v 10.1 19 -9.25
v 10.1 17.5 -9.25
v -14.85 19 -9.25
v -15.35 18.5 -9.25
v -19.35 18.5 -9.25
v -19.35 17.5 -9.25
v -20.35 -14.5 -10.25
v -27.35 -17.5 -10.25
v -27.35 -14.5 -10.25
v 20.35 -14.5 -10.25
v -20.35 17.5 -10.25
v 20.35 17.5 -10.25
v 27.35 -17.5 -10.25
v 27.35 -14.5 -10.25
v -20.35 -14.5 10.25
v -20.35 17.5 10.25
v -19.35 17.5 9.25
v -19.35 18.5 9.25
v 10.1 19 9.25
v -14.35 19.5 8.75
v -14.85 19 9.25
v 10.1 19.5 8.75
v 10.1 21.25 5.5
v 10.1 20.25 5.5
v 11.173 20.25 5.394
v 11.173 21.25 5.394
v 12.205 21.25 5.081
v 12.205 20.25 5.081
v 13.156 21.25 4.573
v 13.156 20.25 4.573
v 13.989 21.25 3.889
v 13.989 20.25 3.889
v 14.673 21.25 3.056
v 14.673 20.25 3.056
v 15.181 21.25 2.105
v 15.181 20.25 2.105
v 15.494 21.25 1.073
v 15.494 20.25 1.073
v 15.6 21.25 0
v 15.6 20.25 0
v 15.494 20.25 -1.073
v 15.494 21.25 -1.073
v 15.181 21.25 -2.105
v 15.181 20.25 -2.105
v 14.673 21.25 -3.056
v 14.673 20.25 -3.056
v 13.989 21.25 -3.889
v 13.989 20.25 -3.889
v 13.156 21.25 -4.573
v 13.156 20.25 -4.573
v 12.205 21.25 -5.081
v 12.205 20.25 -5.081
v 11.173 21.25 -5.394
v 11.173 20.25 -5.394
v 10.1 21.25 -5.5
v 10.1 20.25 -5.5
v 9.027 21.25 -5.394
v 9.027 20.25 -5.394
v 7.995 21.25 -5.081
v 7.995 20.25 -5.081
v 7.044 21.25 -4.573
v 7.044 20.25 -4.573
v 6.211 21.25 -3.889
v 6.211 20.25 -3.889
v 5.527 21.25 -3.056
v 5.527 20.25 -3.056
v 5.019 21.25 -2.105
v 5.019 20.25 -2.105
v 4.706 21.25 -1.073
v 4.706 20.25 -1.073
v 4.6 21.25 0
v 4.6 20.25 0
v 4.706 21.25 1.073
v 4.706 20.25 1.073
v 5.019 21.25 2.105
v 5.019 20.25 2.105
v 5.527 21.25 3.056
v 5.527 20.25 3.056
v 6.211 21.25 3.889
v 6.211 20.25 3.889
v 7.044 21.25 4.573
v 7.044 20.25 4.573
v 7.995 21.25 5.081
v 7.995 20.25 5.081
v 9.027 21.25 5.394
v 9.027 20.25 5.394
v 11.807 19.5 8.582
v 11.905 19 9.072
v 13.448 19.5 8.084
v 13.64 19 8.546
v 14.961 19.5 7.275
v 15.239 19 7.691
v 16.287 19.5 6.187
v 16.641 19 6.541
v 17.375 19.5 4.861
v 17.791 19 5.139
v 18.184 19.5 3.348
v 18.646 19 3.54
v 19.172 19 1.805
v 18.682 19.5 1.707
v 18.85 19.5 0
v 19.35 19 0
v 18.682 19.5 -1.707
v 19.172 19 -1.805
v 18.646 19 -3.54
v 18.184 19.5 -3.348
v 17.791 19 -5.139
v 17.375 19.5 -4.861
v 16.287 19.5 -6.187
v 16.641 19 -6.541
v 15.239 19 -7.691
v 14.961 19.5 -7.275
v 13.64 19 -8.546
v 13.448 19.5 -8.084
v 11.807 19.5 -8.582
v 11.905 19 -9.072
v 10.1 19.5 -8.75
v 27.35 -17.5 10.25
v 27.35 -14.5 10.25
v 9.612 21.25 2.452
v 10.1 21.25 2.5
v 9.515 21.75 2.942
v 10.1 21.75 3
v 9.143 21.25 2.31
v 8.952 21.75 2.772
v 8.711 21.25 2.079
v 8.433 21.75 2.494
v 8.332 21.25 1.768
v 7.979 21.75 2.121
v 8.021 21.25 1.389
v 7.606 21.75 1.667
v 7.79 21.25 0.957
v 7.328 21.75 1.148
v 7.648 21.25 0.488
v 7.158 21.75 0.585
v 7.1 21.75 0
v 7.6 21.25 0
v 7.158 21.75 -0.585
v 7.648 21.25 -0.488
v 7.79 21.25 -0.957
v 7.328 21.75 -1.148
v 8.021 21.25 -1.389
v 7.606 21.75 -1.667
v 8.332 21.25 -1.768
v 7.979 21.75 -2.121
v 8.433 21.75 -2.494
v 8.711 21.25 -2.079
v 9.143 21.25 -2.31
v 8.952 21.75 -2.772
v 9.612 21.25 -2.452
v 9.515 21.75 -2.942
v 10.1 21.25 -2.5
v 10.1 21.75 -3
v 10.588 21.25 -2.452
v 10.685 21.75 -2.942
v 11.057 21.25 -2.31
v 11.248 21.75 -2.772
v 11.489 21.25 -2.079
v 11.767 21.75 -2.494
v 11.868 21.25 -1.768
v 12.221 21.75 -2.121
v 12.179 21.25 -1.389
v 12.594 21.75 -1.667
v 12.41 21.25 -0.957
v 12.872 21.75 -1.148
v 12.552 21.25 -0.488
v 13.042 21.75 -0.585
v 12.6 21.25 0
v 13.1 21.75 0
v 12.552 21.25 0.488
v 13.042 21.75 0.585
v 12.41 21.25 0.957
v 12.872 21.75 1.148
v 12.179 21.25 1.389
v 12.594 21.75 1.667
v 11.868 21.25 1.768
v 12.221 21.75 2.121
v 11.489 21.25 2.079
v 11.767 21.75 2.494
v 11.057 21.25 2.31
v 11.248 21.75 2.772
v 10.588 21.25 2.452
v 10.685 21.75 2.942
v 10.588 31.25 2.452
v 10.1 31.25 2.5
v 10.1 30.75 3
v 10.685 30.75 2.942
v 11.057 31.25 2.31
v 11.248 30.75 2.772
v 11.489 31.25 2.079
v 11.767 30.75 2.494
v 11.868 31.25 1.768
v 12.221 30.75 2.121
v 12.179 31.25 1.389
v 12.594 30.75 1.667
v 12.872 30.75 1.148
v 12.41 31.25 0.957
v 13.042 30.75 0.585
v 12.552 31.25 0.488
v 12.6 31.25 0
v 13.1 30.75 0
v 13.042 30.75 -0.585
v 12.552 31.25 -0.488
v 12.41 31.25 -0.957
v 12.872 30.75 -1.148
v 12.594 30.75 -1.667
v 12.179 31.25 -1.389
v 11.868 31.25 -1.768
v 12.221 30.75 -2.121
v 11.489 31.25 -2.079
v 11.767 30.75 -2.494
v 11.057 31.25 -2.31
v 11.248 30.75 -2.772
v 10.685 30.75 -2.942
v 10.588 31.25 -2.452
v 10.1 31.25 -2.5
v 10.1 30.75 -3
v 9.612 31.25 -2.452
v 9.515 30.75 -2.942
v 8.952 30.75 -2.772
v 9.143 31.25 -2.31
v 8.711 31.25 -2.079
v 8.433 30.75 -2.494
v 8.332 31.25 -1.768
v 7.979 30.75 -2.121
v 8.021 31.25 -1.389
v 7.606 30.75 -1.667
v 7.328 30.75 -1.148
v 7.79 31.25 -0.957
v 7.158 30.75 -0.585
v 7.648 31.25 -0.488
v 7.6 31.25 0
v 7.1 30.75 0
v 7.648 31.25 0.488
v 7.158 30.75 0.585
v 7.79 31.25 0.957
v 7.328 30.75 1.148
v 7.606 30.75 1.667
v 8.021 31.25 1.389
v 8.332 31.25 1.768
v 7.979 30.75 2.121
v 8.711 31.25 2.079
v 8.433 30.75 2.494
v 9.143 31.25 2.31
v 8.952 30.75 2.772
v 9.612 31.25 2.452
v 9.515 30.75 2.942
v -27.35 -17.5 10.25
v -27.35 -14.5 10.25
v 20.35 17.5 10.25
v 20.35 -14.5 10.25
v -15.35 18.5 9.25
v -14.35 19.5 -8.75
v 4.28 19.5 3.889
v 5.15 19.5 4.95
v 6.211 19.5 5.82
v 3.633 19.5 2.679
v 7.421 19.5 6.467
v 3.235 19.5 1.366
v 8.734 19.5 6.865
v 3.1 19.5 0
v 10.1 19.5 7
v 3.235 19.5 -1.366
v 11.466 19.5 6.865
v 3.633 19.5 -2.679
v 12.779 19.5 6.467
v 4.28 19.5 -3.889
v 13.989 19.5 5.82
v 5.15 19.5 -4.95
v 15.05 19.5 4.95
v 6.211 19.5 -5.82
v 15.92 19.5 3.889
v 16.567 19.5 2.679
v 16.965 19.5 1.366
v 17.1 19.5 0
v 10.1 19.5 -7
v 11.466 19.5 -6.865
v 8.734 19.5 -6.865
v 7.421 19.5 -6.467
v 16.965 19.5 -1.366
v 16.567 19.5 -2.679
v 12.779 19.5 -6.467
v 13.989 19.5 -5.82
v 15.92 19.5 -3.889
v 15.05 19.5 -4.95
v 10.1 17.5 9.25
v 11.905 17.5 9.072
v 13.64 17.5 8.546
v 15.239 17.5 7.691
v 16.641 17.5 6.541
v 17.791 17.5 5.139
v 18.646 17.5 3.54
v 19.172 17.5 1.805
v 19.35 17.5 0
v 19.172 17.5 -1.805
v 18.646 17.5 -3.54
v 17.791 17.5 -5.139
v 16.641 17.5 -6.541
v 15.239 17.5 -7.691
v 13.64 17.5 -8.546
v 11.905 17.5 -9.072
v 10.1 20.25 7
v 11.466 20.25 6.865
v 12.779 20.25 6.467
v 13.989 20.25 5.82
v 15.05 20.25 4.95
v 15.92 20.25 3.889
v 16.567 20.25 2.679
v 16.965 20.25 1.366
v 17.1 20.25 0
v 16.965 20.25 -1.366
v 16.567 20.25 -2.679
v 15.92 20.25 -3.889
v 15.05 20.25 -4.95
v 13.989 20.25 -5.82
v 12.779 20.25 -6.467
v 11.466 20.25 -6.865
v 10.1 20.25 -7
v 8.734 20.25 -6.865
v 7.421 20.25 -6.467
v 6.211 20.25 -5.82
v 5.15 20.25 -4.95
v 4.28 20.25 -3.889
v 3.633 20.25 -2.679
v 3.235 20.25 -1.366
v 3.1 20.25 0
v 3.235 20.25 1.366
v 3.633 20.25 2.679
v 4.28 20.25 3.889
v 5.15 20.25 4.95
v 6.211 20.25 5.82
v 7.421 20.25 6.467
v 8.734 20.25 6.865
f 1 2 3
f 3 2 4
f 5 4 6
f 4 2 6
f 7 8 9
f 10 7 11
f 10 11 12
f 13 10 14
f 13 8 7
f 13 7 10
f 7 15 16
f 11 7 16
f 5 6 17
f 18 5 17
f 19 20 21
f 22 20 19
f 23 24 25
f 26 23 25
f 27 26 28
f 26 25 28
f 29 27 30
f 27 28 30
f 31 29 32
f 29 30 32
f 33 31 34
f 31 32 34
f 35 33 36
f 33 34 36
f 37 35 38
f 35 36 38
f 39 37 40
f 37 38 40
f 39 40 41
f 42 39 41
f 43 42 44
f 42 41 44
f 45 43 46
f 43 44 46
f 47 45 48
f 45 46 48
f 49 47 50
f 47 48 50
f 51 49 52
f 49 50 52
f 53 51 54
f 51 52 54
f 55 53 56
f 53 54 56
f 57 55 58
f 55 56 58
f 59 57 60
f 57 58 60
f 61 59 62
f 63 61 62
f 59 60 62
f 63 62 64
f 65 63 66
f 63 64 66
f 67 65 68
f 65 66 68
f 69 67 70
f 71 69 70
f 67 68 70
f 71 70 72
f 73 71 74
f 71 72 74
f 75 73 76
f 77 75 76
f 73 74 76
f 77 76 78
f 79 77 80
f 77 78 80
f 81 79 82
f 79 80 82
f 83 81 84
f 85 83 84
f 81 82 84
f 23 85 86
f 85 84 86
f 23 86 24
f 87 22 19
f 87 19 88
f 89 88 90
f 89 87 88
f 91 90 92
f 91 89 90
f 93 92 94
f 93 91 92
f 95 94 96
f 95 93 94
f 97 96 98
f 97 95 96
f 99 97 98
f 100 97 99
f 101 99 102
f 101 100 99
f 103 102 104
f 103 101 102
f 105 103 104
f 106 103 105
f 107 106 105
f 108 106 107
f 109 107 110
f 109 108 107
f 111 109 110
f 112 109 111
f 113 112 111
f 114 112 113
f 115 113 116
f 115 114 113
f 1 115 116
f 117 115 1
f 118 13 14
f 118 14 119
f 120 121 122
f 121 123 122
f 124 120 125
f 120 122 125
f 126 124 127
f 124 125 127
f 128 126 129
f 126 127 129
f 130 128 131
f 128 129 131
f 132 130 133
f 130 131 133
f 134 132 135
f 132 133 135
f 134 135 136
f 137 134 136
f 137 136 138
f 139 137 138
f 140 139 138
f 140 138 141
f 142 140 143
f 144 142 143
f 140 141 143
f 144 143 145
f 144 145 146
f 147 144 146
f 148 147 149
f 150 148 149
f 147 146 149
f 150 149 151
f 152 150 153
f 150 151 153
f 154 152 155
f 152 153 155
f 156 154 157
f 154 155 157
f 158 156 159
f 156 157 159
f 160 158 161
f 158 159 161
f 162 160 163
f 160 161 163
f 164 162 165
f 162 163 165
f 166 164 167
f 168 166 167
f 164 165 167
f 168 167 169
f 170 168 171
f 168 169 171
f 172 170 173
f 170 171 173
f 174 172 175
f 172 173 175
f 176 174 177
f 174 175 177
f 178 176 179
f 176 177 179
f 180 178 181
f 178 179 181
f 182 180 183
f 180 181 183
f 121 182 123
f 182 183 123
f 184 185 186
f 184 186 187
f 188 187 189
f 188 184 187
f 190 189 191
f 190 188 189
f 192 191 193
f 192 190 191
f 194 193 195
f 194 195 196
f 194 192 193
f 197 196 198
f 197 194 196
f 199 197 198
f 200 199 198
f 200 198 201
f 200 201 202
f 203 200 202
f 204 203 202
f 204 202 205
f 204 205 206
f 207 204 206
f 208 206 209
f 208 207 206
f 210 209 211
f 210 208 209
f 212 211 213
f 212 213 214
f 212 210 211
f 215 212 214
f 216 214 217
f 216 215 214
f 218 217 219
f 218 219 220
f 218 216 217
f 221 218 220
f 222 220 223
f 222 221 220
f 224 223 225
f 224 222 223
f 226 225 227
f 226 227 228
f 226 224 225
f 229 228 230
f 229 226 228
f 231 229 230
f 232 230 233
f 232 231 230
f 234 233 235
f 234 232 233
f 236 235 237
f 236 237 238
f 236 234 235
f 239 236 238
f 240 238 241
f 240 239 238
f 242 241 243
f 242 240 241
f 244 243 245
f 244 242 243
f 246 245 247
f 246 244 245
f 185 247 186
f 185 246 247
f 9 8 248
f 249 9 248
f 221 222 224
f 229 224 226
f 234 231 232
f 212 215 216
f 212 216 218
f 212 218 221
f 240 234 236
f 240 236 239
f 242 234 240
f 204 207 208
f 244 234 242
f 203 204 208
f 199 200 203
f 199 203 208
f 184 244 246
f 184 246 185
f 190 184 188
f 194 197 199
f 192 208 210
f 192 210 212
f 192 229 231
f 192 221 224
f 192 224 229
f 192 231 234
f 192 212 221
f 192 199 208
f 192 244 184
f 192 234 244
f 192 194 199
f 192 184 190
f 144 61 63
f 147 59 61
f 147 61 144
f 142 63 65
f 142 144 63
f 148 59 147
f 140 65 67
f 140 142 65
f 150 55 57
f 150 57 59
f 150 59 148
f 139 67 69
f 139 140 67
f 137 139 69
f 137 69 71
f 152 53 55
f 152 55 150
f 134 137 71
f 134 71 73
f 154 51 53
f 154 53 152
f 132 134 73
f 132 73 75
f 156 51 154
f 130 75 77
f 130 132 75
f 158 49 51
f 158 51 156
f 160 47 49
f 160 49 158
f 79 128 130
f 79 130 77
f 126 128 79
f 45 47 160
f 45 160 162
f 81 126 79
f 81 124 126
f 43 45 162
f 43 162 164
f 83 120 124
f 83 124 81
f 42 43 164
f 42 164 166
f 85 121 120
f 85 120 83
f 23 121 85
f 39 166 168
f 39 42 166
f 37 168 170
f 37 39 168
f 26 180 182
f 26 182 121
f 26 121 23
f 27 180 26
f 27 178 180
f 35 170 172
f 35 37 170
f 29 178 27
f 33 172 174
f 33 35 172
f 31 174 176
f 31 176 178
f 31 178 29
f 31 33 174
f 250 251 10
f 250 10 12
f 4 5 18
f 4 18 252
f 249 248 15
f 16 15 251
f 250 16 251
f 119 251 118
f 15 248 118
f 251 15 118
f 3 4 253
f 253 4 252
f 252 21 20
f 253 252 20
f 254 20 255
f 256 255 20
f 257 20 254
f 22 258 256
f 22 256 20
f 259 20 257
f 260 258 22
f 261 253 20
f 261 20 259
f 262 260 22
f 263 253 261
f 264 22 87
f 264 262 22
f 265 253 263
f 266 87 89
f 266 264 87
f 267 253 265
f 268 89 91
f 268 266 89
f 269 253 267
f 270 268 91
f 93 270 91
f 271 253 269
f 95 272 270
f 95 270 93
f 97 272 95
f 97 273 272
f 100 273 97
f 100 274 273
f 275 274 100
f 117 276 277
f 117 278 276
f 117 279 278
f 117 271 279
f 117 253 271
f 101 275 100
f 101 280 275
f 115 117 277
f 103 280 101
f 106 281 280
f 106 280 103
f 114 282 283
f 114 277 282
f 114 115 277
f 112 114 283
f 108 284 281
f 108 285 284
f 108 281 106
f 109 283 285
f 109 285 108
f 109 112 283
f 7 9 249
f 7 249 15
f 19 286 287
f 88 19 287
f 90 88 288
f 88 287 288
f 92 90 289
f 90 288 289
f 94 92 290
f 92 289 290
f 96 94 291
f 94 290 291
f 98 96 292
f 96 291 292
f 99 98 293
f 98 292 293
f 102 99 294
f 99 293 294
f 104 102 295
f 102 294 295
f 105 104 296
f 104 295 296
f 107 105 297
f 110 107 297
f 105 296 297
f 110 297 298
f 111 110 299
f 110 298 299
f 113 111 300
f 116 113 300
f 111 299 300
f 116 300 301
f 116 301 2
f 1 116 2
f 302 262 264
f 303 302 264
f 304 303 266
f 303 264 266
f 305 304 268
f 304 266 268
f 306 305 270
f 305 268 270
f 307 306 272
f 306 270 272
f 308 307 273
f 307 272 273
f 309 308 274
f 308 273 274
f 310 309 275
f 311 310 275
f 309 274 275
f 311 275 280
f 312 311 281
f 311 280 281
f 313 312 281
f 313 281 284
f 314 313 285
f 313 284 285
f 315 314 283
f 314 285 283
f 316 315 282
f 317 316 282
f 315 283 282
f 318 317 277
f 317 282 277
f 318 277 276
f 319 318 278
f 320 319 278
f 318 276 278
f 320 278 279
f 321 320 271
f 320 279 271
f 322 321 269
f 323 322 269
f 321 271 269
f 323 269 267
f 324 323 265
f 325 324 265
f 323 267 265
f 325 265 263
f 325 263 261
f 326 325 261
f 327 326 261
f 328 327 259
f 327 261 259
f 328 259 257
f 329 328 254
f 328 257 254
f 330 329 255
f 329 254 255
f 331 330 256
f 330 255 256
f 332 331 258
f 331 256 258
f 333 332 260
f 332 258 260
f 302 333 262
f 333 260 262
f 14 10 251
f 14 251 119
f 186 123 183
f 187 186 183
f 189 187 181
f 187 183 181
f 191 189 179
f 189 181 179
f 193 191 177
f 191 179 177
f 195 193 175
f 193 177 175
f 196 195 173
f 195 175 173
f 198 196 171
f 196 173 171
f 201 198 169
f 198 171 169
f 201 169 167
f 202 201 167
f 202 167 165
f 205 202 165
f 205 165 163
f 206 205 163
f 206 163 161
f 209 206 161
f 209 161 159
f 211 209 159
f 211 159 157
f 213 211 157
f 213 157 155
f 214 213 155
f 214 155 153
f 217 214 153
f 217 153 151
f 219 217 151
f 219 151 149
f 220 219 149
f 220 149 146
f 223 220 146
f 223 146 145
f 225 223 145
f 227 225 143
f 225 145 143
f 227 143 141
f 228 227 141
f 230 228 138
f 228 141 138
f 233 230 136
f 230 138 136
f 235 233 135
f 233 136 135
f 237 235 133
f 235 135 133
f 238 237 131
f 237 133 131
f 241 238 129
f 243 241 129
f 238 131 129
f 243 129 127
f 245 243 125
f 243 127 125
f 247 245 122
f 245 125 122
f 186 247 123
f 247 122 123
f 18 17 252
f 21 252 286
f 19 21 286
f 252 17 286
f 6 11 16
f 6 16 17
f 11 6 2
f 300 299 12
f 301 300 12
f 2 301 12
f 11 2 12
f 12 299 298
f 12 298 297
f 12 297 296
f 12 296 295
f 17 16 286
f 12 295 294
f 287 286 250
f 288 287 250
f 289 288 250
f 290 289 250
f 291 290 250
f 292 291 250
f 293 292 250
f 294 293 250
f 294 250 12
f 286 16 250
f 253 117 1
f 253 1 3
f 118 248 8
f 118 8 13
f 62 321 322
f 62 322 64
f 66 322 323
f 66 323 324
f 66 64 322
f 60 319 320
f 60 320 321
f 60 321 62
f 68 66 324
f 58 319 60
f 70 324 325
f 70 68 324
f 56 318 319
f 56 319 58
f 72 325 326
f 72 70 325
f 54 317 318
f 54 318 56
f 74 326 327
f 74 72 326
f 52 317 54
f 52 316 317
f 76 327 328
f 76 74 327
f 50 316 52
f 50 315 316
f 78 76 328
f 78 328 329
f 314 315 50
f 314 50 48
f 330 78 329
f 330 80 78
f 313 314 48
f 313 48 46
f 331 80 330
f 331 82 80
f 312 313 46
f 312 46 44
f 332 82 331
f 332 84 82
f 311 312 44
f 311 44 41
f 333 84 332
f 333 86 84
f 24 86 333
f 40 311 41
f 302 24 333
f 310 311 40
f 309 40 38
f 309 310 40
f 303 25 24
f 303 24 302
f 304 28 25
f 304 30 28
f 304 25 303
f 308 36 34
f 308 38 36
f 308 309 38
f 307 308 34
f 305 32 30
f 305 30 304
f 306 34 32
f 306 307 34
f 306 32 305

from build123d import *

# Parameters (mm, degrees)
SKETCH_1_W              = 40.7
SKETCH_1_H              = 35
EXTRUDE_BOSS_DEPTH      = 10.25
EXTRUDE_2_DEPTH         = 2
EXTRUDE_CUT_DEPTH       = 18.5
CROQUIS10_R             = 7
SALIENTE_EXTRUIR5_DEPTH = 0.75
CROQUIS11_R             = 5.5
SALIENTE_EXTRUIR6_DEPTH = 1
CROQUIS12_R             = 3
SALIENTE_EXTRUIR7_DEPTH = 10
CHAFL_N2_SIZE           = 0.5
SKETCH1_W               = 7
SKETCH1_H               = 20.5
BOSS_EXTRUDE1_DEPTH     = 3


with BuildPart() as part:
    # Sketch 1 → Extrude Boss (new, symmetric)
    with BuildSketch(Plane.XY):
        Rectangle(SKETCH_1_W, SKETCH_1_H)
    extrude(amount=EXTRUDE_BOSS_DEPTH, both=True)

    # Sketch 3 → Extrude 2 (add)
    with BuildSketch(Plane(origin=(0, 17.5, 0), x_dir=(1, 0, 0), z_dir=(0, 1, 0))):
        with BuildLine():
            Line((10.1, 9.25), (-19.35, 9.25))
            Line((-19.35, 9.25), (-19.35, -9.25))
            Line((-19.35, -9.25), (10.1, -9.25))
            ThreePointArc((10.1, -9.25), (19.35, 0), (10.1, 9.25))
        make_face()
    extrude(amount=EXTRUDE_2_DEPTH)

    # Sketch 4 → Extrude Cut (cut)
    with BuildSketch(Plane.XY.offset(9.25)):
        Polygon((-19.35, 19.5), (-19.35, 18.5), (-15.35, 18.5), (-14.35, 19.5), align=None)
    extrude(amount=-EXTRUDE_CUT_DEPTH, mode=Mode.SUBTRACT)

    # Croquis10 → Saliente-Extruir5 (add)
    with BuildSketch(Plane(origin=(0, 19.5, 0), x_dir=(1, 0, 0), z_dir=(0, 1, 0))):
        with Locations(Location((10.1, 0, 0), (0, 0, 270))):
            Circle(CROQUIS10_R)
    extrude(amount=SALIENTE_EXTRUIR5_DEPTH)

    # Croquis11 → Saliente-Extruir6 (add)
    with BuildSketch(Plane(origin=(0, 20.25, 0), x_dir=(1, 0, 0), z_dir=(0, 1, 0))):
        with Locations(Location((10.1, 0, 0), (0, 0, 270))):
            Circle(CROQUIS11_R)
    extrude(amount=SALIENTE_EXTRUIR6_DEPTH)

    # Croquis12 → Saliente-Extruir7 (add)
    with BuildSketch(Plane(origin=(0, 21.25, 0), x_dir=(1, 0, 0), z_dir=(0, 1, 0))):
        with Locations(Location((10.1, 0, 0), (0, 0, 270))):
            Circle(CROQUIS12_R)
    extrude(amount=SALIENTE_EXTRUIR7_DEPTH)

    # Chaflán2
    chafl_n2_edges = [part.edges().sort_by_distance(p)[0] for p in [
        (19.35, 19.5, 0),
        (-2.125, 19.5, -9.25),
        (-2.125, 19.5, 9.25),
        (10.1, 31.25, -3),
    ]]
    chamfer(chafl_n2_edges, length=CHAFL_N2_SIZE)

    # Croquis13 → Cortar-Revolución1 (revolve, cut)
    with BuildSketch(Plane.XY, mode=Mode.PRIVATE) as cortar_revoluci_n1_sk:
        Polygon((7.1, 21.75), (7.1, 21.25), (7.6, 21.25), align=None)
    revolve(cortar_revoluci_n1_sk.sketch.rotate(Axis((10.1, 31.25, 0), (0, -1, 0)), 270), axis=Axis((10.1, 31.25, 0), (0, -1, 0)), mode=Mode.SUBTRACT)

    # Sketch1 → Boss-Extrude1 (add)
    with BuildSketch(Plane.XZ.offset(17.5)):
        with Locations((-23.85, 0)):
            Rectangle(SKETCH1_W, SKETCH1_H)
        with Locations((23.85, 0)):
            Rectangle(SKETCH1_W, SKETCH1_H)
    extrude(amount=-BOSS_EXTRUDE1_DEPTH)


solid = part.part
